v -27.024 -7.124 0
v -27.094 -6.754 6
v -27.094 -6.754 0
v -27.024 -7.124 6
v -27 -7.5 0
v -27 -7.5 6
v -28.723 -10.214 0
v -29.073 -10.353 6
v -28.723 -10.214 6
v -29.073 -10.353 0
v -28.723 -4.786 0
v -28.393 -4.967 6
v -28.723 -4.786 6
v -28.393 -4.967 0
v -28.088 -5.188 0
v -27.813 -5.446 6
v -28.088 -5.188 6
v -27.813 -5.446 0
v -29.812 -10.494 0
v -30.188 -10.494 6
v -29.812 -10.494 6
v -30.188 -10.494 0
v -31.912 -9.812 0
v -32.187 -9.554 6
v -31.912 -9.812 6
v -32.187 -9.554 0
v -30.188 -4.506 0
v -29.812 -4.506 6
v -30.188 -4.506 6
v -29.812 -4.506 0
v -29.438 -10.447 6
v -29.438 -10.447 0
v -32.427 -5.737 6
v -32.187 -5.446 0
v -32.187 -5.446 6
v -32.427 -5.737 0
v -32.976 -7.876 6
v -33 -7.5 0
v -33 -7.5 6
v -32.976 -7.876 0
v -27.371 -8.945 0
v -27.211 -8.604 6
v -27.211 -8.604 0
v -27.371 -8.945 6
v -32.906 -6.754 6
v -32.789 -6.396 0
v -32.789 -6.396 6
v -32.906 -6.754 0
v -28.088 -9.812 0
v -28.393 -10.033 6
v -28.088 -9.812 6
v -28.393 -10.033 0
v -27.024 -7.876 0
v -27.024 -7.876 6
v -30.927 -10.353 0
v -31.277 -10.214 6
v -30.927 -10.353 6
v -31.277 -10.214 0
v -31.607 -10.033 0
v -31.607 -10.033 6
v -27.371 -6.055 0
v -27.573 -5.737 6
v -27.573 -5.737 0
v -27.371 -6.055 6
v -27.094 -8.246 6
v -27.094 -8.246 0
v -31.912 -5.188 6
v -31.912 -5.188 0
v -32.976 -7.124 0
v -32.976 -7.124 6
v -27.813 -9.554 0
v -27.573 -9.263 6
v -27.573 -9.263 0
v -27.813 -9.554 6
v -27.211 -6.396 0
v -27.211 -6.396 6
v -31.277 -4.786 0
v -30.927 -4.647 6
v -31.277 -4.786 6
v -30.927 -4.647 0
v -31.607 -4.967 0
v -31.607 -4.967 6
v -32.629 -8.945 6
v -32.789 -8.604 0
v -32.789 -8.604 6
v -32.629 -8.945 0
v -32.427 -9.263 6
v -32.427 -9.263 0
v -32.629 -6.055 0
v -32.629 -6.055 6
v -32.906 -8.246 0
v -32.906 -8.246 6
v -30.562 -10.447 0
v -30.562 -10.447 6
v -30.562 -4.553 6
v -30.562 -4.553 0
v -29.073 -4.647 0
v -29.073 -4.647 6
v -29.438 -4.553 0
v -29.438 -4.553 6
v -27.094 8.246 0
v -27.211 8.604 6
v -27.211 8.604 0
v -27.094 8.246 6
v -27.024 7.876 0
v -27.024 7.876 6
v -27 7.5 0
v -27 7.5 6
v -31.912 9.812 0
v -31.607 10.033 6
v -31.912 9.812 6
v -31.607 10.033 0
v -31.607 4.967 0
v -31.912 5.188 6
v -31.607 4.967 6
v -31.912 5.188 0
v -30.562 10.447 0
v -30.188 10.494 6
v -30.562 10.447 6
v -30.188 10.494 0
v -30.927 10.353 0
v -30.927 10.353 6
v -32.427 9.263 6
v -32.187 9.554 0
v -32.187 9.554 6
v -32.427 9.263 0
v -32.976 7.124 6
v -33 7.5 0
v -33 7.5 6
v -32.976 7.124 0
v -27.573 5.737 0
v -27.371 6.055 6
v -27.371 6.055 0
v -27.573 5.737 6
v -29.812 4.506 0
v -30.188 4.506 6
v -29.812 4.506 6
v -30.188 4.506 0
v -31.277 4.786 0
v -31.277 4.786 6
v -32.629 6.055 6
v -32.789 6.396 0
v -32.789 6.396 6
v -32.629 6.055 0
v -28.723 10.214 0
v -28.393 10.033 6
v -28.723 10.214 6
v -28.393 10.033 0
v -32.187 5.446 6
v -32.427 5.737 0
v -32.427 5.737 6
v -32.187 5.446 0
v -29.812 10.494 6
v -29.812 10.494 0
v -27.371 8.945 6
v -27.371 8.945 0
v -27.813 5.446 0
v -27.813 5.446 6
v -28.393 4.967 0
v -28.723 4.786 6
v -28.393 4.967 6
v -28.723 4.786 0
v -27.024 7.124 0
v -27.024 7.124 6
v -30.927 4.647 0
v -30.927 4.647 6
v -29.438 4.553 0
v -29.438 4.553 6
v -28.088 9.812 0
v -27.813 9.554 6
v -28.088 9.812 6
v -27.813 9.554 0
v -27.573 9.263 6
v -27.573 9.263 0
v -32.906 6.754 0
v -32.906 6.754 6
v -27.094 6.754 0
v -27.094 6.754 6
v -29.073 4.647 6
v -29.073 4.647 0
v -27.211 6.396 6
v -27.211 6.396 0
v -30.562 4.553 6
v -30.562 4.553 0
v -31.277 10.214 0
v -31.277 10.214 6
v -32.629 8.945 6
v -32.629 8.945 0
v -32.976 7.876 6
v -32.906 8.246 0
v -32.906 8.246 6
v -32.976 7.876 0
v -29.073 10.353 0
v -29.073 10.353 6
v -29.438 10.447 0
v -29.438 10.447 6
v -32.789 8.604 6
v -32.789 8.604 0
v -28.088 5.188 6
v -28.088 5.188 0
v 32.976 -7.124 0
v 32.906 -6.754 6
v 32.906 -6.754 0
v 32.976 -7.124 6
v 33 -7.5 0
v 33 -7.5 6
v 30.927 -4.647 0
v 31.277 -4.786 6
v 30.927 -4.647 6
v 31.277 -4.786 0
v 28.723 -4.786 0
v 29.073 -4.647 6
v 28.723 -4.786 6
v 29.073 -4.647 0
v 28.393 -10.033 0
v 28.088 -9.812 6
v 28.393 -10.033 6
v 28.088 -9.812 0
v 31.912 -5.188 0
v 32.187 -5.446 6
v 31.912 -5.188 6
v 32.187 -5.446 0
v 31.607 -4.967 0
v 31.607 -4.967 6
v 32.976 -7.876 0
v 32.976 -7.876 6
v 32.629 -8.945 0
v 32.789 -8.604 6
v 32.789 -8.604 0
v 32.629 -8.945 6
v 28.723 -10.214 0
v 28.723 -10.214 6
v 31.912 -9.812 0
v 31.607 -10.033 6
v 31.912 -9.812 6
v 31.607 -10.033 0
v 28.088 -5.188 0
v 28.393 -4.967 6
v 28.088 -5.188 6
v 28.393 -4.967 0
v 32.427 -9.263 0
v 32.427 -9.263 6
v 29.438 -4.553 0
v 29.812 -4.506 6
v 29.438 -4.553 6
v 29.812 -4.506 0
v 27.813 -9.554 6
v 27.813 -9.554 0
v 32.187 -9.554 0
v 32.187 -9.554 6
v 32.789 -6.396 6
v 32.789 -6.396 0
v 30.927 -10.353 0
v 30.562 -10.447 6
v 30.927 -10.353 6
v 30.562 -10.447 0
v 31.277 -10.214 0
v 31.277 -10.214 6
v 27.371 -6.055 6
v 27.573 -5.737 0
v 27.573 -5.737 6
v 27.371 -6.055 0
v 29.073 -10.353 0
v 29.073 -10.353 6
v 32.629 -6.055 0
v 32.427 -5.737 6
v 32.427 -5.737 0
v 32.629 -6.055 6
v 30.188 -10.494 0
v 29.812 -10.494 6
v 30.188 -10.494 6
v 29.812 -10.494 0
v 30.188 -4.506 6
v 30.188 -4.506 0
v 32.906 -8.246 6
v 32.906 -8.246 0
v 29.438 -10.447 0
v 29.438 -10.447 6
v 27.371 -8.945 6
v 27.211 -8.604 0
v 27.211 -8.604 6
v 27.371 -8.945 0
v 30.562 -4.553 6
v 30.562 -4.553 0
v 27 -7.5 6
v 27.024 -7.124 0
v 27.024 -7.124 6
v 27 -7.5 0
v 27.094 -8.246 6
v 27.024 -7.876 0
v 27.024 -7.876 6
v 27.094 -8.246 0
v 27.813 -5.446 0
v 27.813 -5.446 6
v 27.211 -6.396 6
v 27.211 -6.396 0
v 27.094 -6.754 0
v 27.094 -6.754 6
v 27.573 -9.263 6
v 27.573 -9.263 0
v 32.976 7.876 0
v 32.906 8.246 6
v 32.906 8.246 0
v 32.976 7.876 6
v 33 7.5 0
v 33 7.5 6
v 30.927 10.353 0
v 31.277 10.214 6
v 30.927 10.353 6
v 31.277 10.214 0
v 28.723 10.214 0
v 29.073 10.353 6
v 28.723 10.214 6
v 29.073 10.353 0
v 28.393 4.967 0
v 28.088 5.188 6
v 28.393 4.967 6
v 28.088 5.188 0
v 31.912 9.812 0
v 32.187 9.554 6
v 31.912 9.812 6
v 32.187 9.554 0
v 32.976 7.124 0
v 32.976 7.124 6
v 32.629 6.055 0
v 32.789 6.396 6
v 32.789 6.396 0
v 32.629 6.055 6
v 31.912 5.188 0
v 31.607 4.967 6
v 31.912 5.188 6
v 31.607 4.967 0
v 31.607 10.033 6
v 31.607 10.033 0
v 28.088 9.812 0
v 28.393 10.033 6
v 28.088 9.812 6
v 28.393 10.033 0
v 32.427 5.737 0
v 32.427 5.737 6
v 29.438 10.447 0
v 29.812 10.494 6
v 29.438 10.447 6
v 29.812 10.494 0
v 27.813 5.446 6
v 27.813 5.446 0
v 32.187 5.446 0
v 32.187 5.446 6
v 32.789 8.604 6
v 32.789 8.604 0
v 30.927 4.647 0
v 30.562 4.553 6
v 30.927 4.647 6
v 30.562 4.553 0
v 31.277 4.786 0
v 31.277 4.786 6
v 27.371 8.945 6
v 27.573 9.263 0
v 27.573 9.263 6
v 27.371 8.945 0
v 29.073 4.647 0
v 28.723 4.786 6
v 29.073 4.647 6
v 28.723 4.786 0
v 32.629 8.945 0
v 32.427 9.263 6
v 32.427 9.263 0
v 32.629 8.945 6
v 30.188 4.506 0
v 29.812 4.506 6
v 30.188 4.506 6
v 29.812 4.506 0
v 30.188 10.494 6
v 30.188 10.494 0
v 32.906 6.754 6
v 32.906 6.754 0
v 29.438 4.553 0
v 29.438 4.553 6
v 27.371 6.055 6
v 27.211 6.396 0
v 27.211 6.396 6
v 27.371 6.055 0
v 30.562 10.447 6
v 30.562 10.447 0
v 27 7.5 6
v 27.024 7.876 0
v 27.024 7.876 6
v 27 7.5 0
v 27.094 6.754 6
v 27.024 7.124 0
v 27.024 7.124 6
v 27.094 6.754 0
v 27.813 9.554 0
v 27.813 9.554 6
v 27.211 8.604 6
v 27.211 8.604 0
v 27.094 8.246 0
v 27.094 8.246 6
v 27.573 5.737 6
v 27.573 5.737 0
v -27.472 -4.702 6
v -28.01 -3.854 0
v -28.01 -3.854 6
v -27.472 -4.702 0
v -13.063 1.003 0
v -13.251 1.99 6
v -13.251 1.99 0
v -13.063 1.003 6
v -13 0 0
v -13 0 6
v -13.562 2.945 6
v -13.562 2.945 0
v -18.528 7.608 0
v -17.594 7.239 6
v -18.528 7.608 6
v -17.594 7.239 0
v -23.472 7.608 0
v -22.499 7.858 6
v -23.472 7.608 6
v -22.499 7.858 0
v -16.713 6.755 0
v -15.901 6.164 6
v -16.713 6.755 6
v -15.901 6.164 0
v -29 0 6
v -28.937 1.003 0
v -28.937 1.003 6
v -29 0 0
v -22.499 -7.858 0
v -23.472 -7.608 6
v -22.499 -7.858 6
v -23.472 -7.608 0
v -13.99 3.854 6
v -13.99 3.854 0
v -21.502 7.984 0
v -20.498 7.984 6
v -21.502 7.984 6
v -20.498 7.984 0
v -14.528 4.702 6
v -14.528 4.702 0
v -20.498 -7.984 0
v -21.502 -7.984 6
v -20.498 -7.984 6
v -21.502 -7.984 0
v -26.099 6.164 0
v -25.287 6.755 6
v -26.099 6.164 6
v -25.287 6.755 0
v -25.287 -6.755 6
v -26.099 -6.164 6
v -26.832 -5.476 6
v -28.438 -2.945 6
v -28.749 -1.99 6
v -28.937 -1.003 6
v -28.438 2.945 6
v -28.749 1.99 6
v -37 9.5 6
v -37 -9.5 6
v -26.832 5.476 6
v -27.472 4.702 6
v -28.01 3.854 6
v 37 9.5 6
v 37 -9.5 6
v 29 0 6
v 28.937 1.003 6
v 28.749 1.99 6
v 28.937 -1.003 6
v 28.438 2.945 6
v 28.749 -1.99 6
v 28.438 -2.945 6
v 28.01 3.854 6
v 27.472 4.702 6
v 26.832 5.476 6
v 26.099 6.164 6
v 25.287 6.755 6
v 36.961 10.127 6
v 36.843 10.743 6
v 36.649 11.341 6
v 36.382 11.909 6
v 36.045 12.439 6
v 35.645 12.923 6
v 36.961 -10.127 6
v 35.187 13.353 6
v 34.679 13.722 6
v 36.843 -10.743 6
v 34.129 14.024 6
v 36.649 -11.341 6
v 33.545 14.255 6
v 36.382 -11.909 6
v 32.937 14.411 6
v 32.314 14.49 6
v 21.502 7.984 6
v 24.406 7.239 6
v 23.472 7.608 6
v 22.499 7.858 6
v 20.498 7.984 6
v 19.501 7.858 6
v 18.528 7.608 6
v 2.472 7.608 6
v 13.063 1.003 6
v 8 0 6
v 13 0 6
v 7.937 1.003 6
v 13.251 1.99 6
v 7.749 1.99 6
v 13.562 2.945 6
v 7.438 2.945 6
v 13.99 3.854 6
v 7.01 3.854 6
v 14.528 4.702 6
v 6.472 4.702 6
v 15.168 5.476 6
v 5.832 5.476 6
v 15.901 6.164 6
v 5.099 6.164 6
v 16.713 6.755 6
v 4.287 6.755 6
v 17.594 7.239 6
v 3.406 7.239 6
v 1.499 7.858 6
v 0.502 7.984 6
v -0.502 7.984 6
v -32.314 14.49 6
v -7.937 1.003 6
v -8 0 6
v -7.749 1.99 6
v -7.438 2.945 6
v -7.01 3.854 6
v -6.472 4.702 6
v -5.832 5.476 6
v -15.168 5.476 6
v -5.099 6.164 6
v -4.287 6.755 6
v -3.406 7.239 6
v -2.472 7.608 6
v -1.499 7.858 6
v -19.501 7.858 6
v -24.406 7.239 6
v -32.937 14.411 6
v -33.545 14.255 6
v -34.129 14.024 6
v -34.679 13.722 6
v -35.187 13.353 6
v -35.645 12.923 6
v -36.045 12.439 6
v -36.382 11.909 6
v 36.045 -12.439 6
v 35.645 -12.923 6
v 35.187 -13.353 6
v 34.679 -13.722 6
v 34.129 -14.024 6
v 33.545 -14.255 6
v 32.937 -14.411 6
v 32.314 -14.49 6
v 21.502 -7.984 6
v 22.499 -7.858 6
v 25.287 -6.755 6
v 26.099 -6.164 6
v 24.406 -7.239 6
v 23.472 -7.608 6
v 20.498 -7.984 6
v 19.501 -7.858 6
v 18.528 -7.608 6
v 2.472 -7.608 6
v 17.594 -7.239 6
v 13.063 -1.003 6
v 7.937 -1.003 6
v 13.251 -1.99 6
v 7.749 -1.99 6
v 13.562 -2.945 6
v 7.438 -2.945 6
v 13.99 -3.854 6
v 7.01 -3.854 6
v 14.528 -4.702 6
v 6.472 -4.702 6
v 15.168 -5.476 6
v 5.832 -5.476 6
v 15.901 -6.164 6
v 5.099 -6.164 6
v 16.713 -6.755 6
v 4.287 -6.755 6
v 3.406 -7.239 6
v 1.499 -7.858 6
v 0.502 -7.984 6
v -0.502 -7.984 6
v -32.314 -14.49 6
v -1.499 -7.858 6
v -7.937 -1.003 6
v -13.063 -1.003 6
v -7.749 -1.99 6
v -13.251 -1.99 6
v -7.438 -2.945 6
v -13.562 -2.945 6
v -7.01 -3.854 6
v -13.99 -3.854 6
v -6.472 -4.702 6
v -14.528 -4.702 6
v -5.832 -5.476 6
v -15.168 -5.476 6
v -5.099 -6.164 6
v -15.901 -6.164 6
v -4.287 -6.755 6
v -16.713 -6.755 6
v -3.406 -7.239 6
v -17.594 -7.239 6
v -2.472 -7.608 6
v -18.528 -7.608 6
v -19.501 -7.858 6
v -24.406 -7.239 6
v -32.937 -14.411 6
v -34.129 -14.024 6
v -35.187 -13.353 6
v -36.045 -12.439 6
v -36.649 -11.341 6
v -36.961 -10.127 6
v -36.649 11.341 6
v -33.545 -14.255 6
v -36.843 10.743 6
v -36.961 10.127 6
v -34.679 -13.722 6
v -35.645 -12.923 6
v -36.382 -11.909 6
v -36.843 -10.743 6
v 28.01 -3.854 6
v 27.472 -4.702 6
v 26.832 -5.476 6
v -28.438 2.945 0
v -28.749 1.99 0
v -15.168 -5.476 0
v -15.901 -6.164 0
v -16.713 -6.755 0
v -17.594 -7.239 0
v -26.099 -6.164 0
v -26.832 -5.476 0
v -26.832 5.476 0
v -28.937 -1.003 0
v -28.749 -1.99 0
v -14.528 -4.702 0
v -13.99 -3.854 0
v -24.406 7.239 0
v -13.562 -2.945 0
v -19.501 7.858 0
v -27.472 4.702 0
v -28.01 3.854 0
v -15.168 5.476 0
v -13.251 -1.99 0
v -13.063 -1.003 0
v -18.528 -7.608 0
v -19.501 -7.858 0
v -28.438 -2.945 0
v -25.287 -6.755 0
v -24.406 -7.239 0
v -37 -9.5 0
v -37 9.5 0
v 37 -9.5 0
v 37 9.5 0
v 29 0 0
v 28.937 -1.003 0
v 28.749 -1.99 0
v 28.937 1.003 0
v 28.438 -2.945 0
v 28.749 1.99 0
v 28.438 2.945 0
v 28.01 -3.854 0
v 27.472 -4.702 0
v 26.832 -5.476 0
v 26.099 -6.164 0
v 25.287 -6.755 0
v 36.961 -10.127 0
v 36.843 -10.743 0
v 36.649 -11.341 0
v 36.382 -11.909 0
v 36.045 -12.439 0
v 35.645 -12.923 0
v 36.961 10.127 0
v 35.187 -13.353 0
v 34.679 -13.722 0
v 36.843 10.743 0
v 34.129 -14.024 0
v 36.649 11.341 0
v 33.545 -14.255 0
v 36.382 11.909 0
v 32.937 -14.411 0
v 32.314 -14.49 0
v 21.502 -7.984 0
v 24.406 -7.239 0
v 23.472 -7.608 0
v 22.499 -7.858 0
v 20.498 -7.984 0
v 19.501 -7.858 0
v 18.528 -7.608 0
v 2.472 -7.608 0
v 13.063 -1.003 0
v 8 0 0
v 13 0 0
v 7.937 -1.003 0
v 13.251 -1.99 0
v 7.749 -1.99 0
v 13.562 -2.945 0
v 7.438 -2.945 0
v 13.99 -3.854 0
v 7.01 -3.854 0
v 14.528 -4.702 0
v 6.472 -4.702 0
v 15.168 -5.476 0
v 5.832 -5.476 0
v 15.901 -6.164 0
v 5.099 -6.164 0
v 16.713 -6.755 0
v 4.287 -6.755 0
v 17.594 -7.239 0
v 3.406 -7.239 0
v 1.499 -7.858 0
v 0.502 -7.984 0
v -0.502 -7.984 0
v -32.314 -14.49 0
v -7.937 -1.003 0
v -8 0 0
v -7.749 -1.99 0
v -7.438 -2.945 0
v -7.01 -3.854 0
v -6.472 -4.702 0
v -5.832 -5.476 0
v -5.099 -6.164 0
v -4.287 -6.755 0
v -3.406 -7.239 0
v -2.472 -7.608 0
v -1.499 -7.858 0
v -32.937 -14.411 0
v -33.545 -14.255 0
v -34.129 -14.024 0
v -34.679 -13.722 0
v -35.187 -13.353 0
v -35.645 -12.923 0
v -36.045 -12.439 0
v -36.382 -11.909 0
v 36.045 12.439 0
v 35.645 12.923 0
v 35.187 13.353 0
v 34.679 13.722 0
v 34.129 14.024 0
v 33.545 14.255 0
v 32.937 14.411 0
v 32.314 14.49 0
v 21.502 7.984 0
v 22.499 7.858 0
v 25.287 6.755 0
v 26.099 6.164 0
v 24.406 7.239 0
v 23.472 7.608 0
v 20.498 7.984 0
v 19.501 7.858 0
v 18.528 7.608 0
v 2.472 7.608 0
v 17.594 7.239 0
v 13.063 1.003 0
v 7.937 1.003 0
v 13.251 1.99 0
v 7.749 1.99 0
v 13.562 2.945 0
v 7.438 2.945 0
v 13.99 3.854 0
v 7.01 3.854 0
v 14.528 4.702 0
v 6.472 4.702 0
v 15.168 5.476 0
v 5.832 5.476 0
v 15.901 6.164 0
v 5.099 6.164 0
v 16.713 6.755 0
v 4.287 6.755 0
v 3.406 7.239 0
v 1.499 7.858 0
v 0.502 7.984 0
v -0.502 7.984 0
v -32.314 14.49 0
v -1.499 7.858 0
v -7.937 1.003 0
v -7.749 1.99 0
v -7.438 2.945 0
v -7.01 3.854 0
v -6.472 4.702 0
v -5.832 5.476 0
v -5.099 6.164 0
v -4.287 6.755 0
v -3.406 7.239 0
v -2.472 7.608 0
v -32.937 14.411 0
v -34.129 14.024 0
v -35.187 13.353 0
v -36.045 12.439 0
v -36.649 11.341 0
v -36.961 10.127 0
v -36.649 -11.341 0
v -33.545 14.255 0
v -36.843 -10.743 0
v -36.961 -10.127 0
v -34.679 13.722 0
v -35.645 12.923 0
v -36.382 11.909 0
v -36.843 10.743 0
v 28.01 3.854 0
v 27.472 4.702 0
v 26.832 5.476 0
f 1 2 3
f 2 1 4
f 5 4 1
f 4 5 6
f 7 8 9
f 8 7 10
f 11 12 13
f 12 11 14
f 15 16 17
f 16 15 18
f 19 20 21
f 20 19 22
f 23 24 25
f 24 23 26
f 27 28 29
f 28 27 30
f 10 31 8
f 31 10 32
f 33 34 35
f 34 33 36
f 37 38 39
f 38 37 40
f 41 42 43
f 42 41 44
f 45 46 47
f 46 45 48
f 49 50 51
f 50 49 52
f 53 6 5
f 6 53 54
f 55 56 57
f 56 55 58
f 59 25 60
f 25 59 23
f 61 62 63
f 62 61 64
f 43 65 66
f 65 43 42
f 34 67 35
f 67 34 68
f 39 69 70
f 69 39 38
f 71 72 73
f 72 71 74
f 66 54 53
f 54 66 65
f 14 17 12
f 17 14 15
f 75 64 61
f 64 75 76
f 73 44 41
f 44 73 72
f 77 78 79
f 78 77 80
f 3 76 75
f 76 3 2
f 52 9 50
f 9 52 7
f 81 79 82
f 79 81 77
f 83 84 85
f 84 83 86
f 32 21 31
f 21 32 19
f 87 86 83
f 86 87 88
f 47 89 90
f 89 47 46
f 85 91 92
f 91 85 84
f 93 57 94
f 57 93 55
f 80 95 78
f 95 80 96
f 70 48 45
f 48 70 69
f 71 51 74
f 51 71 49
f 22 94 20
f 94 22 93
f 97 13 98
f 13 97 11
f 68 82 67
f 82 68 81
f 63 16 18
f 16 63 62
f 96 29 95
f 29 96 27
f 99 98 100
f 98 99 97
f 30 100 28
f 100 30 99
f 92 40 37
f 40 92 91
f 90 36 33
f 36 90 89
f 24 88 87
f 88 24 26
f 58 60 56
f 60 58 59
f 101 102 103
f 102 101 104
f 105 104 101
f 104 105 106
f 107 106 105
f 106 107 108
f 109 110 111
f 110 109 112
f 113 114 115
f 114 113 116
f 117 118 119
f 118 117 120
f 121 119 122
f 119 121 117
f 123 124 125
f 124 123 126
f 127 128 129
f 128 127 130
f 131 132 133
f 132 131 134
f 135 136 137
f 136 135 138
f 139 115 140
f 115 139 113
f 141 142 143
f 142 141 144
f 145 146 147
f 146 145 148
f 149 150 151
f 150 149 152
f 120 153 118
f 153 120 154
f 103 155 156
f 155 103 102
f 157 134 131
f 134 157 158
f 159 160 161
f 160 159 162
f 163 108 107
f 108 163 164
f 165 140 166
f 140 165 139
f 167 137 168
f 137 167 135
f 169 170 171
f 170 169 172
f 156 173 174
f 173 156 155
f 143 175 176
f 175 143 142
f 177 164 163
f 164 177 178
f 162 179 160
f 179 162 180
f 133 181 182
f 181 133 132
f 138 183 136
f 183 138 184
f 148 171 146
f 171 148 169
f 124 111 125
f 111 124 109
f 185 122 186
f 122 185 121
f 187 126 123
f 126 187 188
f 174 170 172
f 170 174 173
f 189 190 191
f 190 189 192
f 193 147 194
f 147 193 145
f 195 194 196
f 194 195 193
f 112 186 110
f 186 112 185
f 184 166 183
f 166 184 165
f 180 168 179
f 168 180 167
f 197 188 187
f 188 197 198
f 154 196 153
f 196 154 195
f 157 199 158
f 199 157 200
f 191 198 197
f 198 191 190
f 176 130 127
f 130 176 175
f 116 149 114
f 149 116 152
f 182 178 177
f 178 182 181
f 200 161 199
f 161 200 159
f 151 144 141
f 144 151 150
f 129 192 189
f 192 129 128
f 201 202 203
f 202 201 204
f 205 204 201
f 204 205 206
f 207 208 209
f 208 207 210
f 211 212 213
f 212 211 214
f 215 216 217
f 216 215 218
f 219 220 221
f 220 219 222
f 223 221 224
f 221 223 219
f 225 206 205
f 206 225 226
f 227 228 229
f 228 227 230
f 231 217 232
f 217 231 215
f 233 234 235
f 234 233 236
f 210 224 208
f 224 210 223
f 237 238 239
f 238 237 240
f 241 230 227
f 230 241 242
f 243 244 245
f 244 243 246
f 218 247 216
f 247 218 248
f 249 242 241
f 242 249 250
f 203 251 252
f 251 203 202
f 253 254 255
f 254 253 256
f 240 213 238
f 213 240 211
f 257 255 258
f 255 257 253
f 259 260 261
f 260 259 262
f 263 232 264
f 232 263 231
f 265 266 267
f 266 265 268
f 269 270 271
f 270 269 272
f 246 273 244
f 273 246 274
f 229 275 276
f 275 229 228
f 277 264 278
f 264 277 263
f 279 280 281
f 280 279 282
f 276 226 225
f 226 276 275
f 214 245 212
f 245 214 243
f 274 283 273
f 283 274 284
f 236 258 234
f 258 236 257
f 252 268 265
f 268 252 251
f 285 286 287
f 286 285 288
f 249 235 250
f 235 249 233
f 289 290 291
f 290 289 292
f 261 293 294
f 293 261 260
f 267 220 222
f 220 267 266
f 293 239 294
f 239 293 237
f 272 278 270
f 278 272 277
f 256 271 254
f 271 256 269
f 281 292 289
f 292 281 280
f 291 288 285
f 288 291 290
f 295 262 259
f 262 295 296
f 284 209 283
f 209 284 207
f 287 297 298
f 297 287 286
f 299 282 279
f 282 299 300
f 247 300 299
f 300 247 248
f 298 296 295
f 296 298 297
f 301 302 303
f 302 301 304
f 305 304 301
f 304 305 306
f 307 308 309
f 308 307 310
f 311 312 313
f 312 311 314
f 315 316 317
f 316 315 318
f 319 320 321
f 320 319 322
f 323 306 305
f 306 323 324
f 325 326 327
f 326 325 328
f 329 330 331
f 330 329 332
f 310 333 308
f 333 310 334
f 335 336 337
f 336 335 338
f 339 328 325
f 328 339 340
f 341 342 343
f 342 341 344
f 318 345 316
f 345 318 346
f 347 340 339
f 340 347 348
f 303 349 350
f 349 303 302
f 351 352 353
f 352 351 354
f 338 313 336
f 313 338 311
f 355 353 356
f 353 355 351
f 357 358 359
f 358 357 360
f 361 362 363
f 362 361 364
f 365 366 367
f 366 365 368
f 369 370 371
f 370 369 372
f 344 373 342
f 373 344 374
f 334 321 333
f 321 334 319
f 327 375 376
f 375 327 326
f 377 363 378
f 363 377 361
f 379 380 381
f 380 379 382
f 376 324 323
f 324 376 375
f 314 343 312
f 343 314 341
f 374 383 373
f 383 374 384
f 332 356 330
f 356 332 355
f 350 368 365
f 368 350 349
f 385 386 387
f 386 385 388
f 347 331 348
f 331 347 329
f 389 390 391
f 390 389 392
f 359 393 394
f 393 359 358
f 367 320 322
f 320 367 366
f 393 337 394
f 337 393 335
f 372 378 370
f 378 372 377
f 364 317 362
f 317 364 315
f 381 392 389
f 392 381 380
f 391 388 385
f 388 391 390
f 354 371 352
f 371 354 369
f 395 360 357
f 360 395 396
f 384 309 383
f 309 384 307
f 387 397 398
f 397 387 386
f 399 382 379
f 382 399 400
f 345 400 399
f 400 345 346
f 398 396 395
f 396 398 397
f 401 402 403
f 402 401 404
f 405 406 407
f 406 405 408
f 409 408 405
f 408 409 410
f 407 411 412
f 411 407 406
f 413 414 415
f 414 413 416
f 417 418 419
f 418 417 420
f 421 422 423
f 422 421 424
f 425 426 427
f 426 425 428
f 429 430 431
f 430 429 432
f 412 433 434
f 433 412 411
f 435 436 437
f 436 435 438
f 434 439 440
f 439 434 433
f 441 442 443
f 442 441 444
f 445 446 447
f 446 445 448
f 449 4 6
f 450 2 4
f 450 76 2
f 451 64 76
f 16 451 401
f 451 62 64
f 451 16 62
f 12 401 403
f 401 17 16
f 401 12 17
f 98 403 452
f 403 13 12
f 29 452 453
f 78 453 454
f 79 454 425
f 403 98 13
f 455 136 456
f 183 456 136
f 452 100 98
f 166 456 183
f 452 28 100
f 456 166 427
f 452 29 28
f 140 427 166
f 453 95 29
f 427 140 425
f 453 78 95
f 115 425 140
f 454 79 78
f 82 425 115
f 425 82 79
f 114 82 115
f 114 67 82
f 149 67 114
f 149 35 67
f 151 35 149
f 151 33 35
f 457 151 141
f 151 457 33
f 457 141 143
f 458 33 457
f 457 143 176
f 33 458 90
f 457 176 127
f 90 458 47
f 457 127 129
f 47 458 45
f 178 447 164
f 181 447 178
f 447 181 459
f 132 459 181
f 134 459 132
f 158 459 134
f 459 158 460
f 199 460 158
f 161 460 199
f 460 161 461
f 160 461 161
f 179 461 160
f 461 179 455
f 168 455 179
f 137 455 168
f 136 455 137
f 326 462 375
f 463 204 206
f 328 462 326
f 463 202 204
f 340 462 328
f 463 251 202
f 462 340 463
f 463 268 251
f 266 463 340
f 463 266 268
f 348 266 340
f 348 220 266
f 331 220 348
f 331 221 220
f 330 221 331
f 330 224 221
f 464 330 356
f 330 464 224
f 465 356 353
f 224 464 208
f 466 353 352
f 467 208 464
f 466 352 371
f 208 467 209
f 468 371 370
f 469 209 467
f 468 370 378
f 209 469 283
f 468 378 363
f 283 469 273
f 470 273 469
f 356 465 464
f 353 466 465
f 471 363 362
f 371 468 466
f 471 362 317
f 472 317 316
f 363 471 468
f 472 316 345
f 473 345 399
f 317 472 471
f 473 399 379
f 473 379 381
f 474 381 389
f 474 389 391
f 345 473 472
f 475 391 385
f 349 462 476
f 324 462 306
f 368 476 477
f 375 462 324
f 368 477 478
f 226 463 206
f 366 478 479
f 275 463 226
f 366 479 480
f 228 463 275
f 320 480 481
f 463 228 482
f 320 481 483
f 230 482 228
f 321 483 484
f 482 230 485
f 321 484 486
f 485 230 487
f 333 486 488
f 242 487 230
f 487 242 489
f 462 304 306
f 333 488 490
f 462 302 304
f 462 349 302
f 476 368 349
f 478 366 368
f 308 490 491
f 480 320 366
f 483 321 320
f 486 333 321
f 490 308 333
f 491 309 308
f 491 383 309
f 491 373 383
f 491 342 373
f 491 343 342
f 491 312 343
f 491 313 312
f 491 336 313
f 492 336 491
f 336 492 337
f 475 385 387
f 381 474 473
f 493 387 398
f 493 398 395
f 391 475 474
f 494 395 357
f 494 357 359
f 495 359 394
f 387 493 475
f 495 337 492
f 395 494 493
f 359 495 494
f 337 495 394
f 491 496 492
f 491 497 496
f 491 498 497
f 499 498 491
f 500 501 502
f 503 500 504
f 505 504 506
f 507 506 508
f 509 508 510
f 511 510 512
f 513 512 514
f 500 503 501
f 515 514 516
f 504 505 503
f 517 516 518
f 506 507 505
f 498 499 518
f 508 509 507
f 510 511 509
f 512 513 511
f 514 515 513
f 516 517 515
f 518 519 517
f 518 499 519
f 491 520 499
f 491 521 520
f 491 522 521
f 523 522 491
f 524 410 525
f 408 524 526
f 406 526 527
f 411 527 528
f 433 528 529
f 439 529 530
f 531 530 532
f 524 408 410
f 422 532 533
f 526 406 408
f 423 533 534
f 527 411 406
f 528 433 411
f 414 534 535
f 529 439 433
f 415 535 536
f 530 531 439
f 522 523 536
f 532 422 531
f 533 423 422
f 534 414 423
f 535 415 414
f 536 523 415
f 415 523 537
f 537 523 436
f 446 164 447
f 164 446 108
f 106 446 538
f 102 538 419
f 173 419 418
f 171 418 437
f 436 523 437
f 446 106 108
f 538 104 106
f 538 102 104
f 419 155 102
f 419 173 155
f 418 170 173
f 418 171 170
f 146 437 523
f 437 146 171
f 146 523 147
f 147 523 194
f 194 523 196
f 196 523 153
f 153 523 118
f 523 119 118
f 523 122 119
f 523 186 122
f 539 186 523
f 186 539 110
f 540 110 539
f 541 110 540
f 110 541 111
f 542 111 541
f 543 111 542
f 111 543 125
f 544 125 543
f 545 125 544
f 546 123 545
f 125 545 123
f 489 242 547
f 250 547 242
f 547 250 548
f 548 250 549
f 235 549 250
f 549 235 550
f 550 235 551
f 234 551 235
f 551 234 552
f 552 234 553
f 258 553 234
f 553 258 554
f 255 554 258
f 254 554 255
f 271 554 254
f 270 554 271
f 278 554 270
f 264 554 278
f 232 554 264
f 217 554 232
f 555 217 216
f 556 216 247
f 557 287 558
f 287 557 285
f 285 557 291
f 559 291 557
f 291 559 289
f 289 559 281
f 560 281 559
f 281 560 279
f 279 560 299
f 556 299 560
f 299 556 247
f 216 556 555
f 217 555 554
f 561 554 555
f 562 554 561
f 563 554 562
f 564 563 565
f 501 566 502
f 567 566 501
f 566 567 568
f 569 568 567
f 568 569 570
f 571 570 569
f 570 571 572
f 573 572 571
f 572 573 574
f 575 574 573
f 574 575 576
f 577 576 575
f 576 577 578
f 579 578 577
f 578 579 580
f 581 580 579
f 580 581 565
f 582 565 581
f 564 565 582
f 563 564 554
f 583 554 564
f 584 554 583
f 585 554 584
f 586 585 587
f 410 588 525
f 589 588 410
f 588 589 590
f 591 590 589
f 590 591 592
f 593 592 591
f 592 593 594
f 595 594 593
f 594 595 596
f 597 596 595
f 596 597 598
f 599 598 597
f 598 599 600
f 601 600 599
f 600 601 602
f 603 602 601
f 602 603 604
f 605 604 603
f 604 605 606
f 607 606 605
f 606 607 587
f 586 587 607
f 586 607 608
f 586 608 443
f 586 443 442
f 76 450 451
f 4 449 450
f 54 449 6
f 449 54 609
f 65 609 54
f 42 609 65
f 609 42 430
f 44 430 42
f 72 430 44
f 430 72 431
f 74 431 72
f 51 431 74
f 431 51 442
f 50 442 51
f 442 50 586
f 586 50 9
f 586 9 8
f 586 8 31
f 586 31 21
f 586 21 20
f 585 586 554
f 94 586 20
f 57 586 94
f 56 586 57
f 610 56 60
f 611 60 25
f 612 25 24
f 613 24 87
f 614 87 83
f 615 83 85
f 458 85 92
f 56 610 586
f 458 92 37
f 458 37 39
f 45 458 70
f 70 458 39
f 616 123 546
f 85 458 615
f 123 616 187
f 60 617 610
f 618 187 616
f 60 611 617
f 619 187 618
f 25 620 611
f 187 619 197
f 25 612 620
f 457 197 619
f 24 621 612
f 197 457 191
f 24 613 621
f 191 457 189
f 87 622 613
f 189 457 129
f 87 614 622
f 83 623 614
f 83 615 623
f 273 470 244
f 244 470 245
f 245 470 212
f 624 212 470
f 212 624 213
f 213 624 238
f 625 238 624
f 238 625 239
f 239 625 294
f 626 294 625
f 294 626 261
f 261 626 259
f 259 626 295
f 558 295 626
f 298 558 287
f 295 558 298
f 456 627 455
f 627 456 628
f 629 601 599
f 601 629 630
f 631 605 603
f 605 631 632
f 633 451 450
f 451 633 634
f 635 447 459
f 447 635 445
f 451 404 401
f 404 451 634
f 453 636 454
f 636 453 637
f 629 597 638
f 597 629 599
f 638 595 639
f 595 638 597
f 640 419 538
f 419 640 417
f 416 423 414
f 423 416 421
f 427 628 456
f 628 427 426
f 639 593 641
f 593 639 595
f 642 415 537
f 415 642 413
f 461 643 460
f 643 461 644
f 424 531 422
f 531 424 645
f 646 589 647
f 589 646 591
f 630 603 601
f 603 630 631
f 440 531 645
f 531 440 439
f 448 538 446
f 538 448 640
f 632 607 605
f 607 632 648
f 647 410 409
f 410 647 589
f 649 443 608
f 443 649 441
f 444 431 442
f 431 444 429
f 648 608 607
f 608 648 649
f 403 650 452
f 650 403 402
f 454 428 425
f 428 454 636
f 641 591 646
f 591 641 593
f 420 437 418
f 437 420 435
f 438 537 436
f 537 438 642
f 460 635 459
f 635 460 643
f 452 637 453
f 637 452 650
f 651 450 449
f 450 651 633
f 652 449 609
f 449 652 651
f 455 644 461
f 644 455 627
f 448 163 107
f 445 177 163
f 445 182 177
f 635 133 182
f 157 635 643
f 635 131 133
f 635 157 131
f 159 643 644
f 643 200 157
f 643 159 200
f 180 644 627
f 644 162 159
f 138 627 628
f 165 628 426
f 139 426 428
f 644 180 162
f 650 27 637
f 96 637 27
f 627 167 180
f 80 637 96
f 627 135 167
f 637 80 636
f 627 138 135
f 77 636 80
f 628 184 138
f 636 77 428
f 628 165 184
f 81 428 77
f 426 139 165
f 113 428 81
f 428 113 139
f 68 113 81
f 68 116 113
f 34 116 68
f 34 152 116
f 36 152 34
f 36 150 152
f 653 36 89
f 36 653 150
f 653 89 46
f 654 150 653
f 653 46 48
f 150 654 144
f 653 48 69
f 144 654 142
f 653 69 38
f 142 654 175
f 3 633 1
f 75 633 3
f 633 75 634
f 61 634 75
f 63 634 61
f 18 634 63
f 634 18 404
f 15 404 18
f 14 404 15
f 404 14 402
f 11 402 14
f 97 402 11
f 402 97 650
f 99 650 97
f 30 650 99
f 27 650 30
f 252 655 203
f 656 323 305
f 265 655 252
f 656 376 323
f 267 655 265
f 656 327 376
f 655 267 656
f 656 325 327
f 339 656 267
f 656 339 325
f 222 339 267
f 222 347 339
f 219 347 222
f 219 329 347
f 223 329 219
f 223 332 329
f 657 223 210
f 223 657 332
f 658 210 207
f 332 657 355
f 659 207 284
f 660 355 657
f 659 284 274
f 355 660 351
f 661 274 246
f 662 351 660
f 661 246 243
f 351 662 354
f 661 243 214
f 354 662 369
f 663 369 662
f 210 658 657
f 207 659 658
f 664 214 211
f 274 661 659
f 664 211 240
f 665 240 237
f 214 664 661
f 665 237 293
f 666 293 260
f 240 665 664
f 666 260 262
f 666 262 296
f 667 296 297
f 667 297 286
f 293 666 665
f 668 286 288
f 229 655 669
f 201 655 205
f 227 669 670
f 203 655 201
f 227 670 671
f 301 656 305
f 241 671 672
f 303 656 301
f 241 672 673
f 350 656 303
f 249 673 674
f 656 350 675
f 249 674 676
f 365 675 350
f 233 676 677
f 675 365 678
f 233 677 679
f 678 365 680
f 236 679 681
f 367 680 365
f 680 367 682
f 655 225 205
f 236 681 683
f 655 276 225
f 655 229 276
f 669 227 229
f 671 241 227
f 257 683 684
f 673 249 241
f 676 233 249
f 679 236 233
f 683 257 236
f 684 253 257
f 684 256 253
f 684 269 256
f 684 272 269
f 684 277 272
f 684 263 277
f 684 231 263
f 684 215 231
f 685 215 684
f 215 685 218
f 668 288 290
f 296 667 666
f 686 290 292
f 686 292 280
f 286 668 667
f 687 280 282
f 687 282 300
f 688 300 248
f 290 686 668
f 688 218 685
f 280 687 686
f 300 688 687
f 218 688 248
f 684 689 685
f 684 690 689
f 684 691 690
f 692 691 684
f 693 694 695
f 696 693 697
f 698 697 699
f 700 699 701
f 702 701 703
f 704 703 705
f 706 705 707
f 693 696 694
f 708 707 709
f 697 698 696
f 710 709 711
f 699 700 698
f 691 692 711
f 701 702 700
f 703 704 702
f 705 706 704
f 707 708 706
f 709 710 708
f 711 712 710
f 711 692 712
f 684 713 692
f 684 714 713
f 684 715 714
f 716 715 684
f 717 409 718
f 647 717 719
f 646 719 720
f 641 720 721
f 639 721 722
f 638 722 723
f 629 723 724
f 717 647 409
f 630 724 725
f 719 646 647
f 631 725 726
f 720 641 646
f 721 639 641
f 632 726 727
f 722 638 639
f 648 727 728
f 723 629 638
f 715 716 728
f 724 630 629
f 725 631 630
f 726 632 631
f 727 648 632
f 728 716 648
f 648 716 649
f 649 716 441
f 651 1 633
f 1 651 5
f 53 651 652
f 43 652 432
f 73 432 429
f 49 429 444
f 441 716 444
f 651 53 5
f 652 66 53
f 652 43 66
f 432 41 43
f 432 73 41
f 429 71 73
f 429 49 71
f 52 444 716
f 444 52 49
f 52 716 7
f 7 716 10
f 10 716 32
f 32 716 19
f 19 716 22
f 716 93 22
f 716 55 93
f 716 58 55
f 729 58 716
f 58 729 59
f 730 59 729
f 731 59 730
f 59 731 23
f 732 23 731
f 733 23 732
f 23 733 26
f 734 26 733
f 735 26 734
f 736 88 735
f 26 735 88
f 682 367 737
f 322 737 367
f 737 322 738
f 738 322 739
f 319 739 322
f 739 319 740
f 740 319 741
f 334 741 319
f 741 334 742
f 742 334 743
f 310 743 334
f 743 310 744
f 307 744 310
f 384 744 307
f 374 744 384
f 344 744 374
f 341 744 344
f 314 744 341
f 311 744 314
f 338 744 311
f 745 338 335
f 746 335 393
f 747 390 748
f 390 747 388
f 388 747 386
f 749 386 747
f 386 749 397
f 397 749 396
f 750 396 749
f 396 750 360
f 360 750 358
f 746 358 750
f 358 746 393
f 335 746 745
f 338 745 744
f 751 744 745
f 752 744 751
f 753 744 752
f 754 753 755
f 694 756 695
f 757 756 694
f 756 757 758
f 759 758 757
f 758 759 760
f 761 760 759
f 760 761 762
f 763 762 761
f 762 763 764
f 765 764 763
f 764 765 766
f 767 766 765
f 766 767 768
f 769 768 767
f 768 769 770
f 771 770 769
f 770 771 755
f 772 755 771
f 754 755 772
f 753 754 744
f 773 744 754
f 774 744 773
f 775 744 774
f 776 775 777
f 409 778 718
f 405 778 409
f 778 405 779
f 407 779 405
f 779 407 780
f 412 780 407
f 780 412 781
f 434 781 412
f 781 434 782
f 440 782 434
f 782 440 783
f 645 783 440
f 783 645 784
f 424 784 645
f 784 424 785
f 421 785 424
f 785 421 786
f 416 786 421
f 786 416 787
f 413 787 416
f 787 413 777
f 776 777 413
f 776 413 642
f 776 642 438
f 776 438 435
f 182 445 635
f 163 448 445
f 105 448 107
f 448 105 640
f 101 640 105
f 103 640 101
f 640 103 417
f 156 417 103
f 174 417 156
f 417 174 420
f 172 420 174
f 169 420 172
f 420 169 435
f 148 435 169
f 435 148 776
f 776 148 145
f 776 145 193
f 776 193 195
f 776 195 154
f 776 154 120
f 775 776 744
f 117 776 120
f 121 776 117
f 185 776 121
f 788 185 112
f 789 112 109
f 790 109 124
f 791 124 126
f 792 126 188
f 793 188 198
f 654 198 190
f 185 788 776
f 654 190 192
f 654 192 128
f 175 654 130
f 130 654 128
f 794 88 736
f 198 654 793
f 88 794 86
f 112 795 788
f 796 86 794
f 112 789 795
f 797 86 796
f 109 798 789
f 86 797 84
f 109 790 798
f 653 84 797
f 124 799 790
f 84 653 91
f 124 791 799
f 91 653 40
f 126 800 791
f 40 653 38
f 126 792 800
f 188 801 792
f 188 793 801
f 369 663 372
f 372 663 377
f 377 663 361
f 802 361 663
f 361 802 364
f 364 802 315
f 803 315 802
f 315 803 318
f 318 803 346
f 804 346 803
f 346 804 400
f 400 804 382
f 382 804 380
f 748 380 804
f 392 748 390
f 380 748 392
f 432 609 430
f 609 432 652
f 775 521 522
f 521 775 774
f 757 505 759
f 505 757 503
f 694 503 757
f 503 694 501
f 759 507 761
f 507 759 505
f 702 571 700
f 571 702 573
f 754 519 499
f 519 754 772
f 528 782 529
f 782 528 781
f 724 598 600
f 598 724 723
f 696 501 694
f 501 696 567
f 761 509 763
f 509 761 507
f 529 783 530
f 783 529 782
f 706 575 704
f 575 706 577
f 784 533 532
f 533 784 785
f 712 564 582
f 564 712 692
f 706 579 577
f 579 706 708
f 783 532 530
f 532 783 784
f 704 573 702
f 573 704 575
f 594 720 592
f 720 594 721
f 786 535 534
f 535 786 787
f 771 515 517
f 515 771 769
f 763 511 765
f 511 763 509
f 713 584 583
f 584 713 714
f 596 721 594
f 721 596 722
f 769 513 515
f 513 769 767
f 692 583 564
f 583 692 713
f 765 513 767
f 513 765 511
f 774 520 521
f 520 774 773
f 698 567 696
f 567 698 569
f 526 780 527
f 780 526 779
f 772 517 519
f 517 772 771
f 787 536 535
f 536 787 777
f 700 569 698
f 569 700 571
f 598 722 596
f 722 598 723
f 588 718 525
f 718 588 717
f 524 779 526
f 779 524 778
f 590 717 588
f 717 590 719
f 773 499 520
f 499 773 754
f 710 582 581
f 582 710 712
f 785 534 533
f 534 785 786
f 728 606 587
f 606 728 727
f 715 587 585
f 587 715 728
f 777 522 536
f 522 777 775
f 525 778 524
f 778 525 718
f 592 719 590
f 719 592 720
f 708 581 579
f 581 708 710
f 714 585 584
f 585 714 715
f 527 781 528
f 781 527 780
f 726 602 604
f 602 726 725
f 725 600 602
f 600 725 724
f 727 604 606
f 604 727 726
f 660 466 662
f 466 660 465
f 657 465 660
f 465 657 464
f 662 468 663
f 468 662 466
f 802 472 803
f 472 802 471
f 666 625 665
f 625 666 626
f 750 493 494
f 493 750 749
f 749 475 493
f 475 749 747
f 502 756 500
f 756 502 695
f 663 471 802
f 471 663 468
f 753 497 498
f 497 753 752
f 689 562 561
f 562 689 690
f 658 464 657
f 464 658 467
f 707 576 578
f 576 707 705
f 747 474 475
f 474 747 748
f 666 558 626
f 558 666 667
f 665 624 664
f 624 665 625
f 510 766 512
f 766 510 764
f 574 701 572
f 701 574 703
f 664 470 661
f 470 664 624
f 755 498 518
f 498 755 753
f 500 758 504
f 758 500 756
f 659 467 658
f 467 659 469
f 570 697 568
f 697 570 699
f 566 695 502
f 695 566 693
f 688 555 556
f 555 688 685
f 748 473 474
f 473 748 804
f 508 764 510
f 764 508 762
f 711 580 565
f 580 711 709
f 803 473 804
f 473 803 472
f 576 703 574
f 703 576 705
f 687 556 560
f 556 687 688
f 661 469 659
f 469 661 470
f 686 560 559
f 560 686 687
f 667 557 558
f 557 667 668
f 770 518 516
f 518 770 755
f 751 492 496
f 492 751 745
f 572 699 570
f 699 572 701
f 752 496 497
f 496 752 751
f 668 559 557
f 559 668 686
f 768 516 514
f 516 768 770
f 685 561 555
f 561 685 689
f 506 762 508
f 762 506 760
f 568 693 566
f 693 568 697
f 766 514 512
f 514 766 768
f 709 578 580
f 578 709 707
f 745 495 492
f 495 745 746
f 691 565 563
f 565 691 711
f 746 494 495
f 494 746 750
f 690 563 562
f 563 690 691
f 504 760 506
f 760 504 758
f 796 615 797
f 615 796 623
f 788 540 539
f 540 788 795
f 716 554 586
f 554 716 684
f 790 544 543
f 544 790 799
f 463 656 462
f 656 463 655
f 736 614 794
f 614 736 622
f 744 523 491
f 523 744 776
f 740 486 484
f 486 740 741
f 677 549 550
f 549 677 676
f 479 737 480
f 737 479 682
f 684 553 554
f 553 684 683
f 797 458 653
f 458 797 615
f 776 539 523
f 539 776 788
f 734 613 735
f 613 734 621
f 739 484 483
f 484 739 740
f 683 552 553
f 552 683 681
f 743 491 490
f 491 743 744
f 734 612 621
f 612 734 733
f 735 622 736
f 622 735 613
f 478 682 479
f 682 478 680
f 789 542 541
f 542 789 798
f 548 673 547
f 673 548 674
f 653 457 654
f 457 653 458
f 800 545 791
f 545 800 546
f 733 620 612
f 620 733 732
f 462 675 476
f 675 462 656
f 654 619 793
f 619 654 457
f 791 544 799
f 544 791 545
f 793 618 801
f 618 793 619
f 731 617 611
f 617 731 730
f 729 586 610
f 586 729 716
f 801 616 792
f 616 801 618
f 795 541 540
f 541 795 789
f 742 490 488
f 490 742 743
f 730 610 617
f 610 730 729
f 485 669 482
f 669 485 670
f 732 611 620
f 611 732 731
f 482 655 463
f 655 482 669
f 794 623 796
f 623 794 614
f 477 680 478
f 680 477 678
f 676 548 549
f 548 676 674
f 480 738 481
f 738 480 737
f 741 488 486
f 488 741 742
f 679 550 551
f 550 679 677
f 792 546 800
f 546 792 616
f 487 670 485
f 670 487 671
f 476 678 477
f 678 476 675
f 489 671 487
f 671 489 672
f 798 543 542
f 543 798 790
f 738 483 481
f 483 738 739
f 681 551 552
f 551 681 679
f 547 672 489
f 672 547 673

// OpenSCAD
$fn = 50;


difference() {
	union() {
		hull() {
			translate(v = [-32.0000000000, 9.5000000000, 0]) {
				cylinder(h = 6, r = 5);
			}
			translate(v = [32.0000000000, 9.5000000000, 0]) {
				cylinder(h = 6, r = 5);
			}
			translate(v = [-32.0000000000, -9.5000000000, 0]) {
				cylinder(h = 6, r = 5);
			}
			translate(v = [32.0000000000, -9.5000000000, 0]) {
				cylinder(h = 6, r = 5);
			}
		}
	}
	union() {
		#translate(v = [-30.0000000000, -7.5000000000, -100.0000000000]) {
			cylinder(h = 200, r = 3.0000000000);
		}
		#translate(v = [-30.0000000000, 7.5000000000, -100.0000000000]) {
			cylinder(h = 200, r = 3.0000000000);
		}
		#translate(v = [30.0000000000, -7.5000000000, -100.0000000000]) {
			cylinder(h = 200, r = 3.0000000000);
		}
		#translate(v = [30.0000000000, 7.5000000000, -100.0000000000]) {
			cylinder(h = 200, r = 3.0000000000);
		}
		#translate(v = [-21.0000000000, 0, 0]) {
			cylinder(h = 6, r = 8.0000000000);
		}
		#cylinder(h = 6, r = 8.0000000000);
		#translate(v = [21.0000000000, 0, 0]) {
			cylinder(h = 6, r = 8.0000000000);
		}
	}
}
